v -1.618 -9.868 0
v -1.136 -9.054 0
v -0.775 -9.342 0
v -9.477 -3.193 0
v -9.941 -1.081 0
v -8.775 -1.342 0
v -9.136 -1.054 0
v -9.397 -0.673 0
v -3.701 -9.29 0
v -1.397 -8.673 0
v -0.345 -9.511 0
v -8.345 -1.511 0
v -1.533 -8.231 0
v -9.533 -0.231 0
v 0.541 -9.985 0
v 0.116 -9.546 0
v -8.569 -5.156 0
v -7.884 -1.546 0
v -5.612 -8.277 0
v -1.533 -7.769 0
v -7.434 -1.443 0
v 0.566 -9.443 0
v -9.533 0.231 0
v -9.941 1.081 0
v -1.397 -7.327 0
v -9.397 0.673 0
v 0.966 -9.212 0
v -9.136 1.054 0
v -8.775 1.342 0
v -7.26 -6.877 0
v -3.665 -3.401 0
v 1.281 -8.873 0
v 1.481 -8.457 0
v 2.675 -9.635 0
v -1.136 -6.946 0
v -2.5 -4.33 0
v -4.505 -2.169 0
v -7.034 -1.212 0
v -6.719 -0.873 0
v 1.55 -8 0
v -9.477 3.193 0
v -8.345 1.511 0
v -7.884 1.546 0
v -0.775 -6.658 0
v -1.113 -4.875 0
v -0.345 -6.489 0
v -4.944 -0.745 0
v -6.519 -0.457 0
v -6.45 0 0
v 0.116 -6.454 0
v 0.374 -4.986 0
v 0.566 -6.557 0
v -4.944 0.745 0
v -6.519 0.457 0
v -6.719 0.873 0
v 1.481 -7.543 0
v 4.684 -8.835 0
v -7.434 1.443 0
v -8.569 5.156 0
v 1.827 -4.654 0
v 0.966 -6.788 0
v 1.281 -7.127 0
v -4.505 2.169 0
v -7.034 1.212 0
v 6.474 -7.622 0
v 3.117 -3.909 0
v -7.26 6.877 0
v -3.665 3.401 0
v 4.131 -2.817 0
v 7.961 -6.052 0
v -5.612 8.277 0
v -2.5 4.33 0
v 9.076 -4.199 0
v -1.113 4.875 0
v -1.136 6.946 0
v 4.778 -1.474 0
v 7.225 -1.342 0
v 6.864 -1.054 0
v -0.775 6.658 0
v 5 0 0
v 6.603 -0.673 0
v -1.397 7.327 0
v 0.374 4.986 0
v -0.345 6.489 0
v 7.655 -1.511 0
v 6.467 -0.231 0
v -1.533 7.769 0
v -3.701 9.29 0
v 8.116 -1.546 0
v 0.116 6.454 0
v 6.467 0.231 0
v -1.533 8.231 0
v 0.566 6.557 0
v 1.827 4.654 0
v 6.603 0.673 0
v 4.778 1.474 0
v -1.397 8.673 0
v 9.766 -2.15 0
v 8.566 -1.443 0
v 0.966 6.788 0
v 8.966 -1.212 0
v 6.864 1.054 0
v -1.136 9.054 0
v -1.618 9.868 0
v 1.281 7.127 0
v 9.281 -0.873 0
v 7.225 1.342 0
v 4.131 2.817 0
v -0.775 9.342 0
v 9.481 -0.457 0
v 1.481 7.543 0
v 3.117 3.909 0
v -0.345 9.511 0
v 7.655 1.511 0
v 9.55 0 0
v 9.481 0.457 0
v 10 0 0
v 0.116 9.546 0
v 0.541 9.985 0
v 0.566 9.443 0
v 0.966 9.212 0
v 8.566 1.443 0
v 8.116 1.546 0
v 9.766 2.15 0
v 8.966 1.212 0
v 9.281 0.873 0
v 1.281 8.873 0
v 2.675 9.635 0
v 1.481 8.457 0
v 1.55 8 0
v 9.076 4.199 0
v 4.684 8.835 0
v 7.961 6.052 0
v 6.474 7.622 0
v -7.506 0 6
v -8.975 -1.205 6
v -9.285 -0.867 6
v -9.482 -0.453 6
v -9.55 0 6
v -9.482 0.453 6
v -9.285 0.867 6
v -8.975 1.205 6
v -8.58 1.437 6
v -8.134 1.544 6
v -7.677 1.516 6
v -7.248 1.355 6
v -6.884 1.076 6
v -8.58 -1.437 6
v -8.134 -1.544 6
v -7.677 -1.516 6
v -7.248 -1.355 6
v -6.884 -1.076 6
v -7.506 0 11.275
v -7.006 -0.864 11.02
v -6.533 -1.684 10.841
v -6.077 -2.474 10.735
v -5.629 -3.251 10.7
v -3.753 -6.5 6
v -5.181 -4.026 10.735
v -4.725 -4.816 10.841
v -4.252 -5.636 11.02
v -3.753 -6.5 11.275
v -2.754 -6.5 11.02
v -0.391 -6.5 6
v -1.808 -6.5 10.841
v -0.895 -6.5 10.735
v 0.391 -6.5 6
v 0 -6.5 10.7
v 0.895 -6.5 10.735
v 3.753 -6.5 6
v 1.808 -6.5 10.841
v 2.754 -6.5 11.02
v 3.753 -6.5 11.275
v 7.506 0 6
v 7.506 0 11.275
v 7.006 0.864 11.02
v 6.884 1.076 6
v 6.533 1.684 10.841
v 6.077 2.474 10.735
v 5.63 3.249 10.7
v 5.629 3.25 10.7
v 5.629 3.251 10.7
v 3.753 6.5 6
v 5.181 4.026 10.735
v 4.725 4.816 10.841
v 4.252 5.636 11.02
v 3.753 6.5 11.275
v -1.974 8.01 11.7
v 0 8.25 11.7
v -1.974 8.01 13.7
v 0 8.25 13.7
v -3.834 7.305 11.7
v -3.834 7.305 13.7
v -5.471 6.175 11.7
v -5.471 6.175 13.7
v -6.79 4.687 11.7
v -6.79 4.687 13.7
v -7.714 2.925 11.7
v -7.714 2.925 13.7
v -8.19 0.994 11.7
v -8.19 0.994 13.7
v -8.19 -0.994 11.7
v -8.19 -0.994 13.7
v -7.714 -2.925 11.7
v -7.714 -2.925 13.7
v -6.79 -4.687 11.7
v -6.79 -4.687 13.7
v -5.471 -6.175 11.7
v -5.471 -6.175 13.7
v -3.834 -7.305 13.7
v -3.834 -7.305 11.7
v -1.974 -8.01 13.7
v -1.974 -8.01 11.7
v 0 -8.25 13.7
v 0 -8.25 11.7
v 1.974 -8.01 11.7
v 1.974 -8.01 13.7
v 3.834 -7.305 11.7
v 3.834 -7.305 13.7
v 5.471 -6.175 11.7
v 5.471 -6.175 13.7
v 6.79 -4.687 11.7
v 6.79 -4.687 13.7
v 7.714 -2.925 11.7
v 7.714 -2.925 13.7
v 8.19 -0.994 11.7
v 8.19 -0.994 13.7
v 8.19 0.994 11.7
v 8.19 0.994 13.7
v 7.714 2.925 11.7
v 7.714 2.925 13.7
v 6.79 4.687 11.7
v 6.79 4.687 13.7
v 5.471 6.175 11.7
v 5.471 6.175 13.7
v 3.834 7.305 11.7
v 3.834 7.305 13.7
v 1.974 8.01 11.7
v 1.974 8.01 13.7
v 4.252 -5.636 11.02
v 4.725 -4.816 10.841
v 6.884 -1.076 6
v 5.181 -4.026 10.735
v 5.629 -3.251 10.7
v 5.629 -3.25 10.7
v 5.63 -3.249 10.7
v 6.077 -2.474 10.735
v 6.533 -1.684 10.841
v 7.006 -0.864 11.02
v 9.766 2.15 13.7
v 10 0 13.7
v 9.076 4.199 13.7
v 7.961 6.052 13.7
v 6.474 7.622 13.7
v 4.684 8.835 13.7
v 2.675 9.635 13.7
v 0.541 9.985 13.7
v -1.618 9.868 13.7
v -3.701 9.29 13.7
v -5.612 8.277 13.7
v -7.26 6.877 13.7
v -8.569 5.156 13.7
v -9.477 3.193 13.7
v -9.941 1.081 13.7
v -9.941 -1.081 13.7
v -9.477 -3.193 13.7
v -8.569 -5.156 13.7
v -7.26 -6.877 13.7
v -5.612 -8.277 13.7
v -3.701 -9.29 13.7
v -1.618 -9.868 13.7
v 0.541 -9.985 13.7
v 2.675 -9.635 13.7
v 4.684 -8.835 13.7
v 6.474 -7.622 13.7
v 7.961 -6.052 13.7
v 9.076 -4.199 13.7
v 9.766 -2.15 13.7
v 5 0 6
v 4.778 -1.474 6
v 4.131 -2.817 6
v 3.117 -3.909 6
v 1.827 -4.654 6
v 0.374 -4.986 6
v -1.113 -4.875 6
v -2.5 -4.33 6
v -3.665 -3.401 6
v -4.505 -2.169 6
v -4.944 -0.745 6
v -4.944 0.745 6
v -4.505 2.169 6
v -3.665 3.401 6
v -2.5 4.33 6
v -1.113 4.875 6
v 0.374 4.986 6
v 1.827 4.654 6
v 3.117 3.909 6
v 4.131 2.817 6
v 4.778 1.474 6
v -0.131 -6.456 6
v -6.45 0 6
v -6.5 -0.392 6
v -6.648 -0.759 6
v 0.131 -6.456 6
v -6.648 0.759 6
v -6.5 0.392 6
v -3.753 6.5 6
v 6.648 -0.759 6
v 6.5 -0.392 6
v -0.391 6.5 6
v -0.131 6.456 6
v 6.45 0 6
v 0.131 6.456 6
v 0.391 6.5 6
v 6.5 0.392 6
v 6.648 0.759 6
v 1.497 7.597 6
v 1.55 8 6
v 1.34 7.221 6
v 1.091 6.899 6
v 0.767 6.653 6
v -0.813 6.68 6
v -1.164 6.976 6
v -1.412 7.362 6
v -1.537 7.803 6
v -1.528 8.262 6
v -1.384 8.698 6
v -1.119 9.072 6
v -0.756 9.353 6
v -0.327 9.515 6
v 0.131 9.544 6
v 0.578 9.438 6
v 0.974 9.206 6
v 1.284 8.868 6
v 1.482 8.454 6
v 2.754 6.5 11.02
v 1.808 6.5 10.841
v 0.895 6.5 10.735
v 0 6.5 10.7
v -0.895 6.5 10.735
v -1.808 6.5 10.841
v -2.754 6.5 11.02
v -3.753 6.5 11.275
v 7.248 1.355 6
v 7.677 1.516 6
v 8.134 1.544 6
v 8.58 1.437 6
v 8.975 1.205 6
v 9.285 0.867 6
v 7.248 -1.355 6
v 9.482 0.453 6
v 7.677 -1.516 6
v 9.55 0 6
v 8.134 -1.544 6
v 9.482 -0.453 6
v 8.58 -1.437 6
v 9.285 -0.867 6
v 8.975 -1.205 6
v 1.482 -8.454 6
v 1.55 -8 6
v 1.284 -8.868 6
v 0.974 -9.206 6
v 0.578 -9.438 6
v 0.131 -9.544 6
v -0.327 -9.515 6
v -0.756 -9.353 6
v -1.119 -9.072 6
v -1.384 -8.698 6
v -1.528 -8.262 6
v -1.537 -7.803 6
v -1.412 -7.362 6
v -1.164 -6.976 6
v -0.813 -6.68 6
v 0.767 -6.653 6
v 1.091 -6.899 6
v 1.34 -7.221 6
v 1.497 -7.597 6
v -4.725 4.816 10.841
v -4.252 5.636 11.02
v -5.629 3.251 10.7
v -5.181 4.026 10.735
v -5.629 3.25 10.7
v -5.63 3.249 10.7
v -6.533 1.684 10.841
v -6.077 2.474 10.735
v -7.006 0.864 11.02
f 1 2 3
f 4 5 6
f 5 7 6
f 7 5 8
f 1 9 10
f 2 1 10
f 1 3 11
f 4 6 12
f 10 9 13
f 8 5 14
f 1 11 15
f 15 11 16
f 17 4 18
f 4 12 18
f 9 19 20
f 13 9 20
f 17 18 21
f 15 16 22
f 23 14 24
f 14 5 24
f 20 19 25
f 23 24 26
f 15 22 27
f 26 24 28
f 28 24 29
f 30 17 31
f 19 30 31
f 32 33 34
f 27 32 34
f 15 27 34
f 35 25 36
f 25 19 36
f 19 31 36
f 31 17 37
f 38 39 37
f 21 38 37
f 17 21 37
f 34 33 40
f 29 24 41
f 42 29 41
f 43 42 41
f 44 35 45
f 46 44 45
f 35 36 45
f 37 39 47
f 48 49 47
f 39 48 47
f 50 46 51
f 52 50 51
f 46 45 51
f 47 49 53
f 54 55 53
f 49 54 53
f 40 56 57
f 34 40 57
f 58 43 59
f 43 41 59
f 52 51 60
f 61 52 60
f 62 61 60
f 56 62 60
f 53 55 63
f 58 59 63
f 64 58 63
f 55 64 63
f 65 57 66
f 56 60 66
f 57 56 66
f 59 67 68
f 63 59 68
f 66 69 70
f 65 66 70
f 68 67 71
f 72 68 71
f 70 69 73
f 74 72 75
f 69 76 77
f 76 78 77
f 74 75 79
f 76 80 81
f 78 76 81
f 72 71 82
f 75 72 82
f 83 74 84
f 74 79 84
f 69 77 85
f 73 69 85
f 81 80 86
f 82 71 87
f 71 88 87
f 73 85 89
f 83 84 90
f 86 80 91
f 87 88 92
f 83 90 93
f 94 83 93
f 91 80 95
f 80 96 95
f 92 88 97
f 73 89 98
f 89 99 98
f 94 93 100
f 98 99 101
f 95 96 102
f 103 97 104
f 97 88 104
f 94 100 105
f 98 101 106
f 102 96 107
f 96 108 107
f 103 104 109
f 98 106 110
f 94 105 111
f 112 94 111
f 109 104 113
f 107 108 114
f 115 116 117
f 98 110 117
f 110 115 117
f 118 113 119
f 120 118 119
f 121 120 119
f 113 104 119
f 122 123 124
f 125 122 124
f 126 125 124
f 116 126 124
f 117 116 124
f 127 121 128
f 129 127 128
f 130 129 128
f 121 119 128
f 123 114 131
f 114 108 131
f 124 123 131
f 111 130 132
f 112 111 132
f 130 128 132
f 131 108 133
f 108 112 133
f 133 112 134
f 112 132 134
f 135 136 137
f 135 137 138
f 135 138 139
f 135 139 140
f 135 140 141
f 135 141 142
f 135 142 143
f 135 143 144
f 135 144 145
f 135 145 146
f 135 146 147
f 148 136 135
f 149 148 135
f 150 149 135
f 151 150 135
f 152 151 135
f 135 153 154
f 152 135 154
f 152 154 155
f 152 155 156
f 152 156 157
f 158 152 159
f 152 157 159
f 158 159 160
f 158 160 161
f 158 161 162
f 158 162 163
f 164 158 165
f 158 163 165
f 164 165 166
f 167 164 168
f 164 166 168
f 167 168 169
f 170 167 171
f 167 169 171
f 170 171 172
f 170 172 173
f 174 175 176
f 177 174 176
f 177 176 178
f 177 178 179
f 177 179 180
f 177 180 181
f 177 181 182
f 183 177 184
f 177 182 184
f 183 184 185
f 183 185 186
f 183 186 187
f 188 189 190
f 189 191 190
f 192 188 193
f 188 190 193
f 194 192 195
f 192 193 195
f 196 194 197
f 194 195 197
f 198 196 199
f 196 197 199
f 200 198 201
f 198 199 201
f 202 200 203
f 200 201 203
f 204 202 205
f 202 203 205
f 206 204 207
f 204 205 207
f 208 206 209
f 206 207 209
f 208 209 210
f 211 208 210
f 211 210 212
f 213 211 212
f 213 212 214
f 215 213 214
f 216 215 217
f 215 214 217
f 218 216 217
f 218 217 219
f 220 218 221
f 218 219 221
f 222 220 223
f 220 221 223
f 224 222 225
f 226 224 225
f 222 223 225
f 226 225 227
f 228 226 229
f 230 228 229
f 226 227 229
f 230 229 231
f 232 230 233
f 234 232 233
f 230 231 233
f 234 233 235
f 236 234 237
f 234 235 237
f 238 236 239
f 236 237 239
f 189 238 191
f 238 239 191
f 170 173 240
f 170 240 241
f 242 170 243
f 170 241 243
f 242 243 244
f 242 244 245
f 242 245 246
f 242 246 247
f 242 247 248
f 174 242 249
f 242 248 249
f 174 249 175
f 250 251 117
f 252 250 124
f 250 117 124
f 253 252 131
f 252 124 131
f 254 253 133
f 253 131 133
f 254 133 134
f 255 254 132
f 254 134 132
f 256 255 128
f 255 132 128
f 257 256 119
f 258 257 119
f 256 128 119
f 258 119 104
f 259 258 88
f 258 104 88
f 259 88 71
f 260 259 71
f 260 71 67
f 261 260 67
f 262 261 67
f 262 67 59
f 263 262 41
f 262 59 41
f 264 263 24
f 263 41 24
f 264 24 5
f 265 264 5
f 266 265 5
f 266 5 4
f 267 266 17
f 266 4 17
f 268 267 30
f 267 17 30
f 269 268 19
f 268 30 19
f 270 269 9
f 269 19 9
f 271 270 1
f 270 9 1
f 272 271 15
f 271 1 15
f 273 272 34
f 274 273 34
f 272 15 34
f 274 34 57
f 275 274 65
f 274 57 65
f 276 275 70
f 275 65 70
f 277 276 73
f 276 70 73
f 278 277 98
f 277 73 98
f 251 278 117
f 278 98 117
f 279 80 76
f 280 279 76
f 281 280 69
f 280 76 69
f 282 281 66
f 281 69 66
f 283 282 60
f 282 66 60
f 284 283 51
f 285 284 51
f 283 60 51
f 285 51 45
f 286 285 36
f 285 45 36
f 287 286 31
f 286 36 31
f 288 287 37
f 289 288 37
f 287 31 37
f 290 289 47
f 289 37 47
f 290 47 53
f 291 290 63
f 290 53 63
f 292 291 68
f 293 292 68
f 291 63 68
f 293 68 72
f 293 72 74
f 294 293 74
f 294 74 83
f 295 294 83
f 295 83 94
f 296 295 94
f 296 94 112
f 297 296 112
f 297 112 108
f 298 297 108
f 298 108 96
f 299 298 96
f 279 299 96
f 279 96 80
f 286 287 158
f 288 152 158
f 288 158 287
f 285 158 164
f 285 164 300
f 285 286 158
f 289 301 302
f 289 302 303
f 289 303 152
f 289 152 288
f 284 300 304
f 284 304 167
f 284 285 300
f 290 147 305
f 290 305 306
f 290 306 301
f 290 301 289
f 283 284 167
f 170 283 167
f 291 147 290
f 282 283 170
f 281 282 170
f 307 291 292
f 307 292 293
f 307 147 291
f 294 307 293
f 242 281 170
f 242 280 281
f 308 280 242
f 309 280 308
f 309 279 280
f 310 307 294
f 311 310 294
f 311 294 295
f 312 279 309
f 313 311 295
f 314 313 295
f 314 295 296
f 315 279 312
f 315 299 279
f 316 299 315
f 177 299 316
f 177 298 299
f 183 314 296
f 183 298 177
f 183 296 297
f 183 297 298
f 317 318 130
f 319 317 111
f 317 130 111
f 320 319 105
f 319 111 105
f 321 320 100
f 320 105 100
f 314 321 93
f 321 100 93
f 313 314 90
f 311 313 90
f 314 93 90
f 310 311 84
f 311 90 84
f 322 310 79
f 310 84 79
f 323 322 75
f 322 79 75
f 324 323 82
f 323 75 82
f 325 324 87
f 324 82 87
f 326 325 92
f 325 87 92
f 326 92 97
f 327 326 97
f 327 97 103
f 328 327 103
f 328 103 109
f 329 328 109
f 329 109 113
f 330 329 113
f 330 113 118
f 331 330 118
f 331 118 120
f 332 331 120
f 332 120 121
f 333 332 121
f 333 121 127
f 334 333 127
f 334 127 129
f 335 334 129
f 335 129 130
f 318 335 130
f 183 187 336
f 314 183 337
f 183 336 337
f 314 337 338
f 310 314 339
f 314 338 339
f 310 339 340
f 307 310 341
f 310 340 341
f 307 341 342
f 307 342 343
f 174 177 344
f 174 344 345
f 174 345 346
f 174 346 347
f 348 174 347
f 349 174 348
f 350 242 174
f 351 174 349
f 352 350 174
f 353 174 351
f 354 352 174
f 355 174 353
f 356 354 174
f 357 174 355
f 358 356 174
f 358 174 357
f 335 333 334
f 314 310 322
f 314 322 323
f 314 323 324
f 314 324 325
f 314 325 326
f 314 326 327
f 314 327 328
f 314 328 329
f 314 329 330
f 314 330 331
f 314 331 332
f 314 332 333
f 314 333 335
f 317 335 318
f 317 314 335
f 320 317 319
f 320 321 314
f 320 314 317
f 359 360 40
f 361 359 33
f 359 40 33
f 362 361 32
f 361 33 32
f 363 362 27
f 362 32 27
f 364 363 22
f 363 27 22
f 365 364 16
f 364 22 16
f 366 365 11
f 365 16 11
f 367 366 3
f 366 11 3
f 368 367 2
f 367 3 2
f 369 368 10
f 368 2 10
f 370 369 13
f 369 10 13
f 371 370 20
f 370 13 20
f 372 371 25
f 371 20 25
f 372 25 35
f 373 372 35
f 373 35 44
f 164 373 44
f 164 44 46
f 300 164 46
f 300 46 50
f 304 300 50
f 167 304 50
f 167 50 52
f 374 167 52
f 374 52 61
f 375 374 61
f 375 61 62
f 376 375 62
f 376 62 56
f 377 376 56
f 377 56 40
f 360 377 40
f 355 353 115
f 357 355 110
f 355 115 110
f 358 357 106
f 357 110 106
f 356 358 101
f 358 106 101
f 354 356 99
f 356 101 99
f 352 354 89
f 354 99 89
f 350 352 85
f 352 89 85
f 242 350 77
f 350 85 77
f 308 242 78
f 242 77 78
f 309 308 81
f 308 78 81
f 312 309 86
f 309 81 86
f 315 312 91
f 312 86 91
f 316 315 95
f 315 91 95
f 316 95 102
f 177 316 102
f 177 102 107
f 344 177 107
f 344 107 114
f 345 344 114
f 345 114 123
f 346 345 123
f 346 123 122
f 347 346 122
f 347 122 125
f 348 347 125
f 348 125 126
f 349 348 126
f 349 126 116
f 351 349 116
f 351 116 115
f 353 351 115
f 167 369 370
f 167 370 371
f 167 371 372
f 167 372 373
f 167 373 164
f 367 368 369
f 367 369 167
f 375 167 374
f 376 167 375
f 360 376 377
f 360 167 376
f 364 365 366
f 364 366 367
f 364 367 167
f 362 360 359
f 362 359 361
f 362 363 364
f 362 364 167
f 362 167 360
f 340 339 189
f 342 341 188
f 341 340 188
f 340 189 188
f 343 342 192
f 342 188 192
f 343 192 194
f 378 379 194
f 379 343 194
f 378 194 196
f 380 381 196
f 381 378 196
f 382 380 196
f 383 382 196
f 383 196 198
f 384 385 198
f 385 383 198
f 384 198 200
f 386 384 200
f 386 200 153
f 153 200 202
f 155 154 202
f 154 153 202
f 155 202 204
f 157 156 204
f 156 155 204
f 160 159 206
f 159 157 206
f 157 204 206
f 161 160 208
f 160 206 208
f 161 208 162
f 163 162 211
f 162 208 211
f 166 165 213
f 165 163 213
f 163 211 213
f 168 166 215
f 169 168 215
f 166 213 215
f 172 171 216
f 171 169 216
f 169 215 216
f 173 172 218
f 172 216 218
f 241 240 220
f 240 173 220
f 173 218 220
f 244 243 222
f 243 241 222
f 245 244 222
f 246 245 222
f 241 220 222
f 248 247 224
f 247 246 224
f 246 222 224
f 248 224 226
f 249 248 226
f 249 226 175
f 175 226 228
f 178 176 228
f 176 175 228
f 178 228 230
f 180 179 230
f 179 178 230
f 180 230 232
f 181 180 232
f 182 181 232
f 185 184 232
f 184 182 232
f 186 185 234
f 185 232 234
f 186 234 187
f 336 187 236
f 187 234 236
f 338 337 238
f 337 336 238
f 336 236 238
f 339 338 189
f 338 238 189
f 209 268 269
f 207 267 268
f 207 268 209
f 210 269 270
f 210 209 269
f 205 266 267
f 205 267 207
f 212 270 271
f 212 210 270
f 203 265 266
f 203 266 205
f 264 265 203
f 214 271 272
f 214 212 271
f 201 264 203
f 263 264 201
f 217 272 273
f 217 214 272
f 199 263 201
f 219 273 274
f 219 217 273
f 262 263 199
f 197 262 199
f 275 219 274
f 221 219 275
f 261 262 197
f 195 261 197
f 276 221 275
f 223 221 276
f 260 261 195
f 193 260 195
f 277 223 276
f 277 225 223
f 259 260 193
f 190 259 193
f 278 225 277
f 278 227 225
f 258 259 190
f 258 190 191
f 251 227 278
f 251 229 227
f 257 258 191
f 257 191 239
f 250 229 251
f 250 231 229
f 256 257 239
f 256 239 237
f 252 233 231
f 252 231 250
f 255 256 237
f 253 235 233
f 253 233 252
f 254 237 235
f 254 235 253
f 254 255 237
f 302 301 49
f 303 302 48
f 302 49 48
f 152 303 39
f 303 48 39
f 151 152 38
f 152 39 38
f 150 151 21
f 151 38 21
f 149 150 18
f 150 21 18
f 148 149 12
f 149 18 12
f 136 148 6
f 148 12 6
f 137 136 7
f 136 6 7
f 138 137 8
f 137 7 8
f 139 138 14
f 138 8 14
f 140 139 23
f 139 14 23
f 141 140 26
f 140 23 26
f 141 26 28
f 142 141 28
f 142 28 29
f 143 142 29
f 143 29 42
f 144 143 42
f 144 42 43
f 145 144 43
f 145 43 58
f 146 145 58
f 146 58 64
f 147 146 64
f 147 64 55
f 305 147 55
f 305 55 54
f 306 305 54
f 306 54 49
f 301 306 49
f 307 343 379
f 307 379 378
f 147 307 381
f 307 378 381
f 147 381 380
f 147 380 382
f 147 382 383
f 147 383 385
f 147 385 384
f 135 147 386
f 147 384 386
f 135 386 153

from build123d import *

# Parameters (mm, degrees)
F0_R     = 10
F1_DEPTH = 13.7
F3_DEPTH = 7.7
F5_R     = 1.55
F6_DEPTH = 6
F8_R     = 5
F9_DEPTH = 25


with BuildPart() as f1:
    # F0 (on Top) → F1 (new body)
    with BuildSketch(Plane.XY):
        Circle(F0_R)
    extrude(amount=F1_DEPTH)

    # F2 (on face) → F3 (cut)
    with BuildSketch(Plane.XY.offset(13.7)):
        Polygon((3.752777, 6.5), (-3.752777, 6.5), (-7.505553, 0), (-3.752777, -6.5), (3.752777, -6.5), (7.505553, 0), align=None)
    extrude(amount=-F3_DEPTH, mode=Mode.SUBTRACT)

    # F5 (on face) → F6 (cut)
    with BuildSketch(Plane(origin=(0, 0, 0), x_dir=(1, 0, 0), z_dir=(0, 0, -1))):
        with Locations((0, 8)):
            Circle(F5_R)
        with Locations((0, -8)):
            Circle(F5_R)
        with Locations((8, 0)):
            Circle(F5_R)
        with Locations((-8, 0)):
            Circle(F5_R)
    extrude(amount=-F6_DEPTH, mode=Mode.SUBTRACT)

    # F4 (on Right) → F7 (revolve, cut)
    with BuildSketch(Plane.YZ):
        Polygon((8.25, 13.7), (0, 13.7), (0, 10.7), (6.5, 10.7), (8.25, 11.7), align=None)
    revolve(axis=Axis((0, 0, 12.2), (0, 0, 1)), mode=Mode.SUBTRACT)

    # F8 (on face) → F9 (cut)
    with BuildSketch(Plane(origin=(0, 0, 0), x_dir=(1, 0, 0), z_dir=(0, 0, -1))):
        Circle(F8_R)
    extrude(amount=-F9_DEPTH, mode=Mode.SUBTRACT)


solid = f1.part
